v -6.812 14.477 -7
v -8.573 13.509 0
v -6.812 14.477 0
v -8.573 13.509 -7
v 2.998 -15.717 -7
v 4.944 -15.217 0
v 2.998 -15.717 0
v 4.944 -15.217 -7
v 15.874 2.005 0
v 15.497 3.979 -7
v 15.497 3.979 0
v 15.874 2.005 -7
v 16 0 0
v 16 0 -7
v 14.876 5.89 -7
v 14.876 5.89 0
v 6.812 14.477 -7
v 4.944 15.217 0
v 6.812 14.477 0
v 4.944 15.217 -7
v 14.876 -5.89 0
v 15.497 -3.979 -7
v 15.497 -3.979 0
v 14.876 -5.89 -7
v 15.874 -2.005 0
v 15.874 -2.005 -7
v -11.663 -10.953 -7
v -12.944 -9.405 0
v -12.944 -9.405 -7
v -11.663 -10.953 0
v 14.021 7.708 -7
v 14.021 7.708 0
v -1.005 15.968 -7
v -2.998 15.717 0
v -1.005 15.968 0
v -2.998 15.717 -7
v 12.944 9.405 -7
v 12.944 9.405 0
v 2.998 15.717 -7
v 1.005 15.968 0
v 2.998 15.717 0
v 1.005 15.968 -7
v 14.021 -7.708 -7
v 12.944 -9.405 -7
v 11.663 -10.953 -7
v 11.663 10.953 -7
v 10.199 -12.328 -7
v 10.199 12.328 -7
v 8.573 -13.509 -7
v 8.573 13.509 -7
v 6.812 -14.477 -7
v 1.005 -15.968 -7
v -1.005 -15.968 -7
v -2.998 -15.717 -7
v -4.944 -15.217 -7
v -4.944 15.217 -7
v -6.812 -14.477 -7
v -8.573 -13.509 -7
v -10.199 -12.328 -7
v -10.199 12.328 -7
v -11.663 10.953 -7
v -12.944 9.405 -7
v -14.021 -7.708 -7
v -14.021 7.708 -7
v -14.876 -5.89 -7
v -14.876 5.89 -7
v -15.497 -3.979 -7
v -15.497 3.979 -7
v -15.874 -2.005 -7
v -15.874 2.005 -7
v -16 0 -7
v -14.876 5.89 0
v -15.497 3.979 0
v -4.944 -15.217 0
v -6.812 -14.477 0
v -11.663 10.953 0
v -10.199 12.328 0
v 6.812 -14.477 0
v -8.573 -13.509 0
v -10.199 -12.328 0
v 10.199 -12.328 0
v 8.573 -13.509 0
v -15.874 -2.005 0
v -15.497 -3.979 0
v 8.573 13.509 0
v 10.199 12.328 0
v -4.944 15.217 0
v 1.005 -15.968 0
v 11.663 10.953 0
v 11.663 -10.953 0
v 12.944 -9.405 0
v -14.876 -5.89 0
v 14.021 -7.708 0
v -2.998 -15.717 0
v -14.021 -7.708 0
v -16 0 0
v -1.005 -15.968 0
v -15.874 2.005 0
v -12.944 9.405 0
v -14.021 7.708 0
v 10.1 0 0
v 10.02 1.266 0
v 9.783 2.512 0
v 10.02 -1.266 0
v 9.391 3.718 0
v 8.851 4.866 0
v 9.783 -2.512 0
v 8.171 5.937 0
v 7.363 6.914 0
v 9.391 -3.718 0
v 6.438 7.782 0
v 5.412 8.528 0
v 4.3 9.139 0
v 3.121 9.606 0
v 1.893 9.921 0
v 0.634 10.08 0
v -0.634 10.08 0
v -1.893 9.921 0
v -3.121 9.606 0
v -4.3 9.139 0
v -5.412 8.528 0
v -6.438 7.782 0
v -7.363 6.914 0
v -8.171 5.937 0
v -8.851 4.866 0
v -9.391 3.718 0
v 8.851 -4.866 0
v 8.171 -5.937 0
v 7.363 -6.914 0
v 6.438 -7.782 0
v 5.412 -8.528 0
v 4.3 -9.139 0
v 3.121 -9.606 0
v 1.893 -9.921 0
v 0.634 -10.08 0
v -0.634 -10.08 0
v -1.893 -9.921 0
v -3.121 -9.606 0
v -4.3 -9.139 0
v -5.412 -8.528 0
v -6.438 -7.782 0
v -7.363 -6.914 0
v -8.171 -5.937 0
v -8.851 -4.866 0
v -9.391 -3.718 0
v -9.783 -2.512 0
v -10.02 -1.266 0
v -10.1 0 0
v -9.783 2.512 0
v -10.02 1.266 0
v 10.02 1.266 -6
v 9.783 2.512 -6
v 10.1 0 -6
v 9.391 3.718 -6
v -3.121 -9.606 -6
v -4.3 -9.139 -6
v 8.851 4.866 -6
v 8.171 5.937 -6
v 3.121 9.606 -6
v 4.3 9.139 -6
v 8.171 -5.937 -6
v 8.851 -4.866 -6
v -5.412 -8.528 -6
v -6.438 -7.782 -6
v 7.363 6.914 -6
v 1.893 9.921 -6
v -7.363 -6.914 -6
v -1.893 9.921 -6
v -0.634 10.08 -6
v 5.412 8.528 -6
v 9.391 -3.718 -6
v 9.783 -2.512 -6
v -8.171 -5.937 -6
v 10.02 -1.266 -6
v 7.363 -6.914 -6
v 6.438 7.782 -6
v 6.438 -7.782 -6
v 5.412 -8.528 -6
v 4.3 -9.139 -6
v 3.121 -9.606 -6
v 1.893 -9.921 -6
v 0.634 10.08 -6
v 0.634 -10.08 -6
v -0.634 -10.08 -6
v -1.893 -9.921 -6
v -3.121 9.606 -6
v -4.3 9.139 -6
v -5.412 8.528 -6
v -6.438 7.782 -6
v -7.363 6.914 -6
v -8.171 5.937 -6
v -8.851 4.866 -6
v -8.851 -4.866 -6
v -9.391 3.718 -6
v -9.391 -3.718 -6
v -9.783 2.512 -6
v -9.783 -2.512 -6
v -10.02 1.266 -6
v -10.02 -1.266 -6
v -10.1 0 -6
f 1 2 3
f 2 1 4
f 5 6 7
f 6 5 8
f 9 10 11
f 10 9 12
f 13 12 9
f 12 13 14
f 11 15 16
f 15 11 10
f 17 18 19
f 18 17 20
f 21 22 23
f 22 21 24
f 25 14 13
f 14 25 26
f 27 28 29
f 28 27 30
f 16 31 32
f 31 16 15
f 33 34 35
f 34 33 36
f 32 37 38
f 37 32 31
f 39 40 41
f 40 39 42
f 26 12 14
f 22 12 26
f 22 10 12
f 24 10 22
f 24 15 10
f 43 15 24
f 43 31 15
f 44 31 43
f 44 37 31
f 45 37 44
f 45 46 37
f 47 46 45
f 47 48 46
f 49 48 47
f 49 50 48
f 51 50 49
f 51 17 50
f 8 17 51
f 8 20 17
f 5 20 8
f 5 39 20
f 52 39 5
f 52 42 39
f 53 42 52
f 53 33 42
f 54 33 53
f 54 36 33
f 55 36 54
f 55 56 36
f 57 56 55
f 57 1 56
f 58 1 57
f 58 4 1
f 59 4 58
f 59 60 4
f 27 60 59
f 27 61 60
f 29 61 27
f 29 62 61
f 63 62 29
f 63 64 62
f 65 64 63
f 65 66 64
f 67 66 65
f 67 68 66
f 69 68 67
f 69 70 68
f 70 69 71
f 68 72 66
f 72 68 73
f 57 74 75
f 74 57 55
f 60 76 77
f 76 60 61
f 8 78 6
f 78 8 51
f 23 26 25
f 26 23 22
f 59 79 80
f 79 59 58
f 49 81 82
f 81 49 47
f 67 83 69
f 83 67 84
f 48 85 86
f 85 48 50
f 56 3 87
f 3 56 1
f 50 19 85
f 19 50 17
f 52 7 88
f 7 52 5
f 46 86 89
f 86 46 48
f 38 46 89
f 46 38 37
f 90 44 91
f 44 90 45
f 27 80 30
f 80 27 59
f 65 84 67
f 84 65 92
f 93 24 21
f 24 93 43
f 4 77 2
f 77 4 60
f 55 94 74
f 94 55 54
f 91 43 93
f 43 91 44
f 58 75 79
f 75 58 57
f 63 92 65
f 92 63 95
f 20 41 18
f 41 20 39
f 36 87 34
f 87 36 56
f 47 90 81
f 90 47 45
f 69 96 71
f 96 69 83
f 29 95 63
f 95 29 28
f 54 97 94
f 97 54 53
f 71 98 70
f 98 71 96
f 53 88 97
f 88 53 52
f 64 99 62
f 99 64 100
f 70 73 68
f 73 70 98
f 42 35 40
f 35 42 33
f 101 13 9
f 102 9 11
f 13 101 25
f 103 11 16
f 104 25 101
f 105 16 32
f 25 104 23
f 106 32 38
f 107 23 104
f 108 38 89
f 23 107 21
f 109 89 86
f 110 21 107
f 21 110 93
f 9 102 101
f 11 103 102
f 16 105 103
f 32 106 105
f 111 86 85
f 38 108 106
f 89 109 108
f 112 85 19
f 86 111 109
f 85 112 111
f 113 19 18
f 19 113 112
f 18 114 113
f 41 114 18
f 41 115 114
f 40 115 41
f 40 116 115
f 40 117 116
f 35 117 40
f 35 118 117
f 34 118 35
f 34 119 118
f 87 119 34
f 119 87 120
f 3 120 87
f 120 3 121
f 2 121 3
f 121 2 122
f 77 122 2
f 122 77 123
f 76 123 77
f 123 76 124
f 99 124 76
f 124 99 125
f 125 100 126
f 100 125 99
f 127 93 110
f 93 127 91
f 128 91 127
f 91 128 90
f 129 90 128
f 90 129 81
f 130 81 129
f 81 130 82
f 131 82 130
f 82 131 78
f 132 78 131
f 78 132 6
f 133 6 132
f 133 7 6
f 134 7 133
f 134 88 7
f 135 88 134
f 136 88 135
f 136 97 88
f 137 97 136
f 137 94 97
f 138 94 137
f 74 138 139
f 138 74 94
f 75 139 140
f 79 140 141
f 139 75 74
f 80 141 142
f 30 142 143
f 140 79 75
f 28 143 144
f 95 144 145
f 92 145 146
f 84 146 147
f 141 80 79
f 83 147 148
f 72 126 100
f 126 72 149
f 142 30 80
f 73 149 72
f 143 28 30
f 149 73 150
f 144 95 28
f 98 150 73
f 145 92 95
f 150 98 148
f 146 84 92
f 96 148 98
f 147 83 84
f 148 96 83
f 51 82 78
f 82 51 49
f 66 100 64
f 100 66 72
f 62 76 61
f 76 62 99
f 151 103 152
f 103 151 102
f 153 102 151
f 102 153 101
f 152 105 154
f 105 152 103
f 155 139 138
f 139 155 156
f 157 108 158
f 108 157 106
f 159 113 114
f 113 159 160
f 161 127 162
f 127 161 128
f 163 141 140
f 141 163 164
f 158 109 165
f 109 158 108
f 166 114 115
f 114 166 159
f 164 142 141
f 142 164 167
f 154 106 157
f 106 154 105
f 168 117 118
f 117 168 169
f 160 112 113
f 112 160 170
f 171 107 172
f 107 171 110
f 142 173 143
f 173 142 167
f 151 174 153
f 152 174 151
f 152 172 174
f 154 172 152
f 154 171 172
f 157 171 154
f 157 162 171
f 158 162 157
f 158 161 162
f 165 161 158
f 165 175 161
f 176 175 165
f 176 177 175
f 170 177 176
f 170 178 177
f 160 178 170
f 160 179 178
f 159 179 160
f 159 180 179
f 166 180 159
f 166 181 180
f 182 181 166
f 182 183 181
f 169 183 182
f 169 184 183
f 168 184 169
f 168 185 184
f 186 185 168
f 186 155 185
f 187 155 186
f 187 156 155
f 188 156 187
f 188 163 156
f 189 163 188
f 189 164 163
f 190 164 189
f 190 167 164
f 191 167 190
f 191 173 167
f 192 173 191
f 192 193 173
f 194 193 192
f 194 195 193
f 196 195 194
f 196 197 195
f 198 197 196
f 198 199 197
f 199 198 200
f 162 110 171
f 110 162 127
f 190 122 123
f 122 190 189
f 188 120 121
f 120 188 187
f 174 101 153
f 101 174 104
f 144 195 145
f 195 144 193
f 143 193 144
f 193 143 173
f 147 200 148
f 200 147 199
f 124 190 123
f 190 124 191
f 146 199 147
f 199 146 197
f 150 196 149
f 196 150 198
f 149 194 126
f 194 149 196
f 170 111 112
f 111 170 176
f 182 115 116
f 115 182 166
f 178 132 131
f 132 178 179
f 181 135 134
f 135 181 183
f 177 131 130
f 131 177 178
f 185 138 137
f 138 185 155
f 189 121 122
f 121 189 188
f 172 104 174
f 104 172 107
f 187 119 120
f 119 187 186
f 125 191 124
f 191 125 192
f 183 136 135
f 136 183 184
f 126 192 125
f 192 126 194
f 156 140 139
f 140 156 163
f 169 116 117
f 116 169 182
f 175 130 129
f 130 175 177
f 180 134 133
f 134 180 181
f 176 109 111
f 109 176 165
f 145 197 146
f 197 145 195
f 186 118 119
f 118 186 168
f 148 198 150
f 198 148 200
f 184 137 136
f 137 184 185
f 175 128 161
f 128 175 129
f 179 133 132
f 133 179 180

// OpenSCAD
$fn = 50;


difference() {
	union() {
		translate(v = [0, 0, -7.0000000000]) {
			cylinder(h = 7, r = 16.0000000000);
		}
	}
	union() {
		#translate(v = [0, 0, -6.0000000000]) {
			cylinder(h = 6, r = 10.1000000000);
		}
	}
}
